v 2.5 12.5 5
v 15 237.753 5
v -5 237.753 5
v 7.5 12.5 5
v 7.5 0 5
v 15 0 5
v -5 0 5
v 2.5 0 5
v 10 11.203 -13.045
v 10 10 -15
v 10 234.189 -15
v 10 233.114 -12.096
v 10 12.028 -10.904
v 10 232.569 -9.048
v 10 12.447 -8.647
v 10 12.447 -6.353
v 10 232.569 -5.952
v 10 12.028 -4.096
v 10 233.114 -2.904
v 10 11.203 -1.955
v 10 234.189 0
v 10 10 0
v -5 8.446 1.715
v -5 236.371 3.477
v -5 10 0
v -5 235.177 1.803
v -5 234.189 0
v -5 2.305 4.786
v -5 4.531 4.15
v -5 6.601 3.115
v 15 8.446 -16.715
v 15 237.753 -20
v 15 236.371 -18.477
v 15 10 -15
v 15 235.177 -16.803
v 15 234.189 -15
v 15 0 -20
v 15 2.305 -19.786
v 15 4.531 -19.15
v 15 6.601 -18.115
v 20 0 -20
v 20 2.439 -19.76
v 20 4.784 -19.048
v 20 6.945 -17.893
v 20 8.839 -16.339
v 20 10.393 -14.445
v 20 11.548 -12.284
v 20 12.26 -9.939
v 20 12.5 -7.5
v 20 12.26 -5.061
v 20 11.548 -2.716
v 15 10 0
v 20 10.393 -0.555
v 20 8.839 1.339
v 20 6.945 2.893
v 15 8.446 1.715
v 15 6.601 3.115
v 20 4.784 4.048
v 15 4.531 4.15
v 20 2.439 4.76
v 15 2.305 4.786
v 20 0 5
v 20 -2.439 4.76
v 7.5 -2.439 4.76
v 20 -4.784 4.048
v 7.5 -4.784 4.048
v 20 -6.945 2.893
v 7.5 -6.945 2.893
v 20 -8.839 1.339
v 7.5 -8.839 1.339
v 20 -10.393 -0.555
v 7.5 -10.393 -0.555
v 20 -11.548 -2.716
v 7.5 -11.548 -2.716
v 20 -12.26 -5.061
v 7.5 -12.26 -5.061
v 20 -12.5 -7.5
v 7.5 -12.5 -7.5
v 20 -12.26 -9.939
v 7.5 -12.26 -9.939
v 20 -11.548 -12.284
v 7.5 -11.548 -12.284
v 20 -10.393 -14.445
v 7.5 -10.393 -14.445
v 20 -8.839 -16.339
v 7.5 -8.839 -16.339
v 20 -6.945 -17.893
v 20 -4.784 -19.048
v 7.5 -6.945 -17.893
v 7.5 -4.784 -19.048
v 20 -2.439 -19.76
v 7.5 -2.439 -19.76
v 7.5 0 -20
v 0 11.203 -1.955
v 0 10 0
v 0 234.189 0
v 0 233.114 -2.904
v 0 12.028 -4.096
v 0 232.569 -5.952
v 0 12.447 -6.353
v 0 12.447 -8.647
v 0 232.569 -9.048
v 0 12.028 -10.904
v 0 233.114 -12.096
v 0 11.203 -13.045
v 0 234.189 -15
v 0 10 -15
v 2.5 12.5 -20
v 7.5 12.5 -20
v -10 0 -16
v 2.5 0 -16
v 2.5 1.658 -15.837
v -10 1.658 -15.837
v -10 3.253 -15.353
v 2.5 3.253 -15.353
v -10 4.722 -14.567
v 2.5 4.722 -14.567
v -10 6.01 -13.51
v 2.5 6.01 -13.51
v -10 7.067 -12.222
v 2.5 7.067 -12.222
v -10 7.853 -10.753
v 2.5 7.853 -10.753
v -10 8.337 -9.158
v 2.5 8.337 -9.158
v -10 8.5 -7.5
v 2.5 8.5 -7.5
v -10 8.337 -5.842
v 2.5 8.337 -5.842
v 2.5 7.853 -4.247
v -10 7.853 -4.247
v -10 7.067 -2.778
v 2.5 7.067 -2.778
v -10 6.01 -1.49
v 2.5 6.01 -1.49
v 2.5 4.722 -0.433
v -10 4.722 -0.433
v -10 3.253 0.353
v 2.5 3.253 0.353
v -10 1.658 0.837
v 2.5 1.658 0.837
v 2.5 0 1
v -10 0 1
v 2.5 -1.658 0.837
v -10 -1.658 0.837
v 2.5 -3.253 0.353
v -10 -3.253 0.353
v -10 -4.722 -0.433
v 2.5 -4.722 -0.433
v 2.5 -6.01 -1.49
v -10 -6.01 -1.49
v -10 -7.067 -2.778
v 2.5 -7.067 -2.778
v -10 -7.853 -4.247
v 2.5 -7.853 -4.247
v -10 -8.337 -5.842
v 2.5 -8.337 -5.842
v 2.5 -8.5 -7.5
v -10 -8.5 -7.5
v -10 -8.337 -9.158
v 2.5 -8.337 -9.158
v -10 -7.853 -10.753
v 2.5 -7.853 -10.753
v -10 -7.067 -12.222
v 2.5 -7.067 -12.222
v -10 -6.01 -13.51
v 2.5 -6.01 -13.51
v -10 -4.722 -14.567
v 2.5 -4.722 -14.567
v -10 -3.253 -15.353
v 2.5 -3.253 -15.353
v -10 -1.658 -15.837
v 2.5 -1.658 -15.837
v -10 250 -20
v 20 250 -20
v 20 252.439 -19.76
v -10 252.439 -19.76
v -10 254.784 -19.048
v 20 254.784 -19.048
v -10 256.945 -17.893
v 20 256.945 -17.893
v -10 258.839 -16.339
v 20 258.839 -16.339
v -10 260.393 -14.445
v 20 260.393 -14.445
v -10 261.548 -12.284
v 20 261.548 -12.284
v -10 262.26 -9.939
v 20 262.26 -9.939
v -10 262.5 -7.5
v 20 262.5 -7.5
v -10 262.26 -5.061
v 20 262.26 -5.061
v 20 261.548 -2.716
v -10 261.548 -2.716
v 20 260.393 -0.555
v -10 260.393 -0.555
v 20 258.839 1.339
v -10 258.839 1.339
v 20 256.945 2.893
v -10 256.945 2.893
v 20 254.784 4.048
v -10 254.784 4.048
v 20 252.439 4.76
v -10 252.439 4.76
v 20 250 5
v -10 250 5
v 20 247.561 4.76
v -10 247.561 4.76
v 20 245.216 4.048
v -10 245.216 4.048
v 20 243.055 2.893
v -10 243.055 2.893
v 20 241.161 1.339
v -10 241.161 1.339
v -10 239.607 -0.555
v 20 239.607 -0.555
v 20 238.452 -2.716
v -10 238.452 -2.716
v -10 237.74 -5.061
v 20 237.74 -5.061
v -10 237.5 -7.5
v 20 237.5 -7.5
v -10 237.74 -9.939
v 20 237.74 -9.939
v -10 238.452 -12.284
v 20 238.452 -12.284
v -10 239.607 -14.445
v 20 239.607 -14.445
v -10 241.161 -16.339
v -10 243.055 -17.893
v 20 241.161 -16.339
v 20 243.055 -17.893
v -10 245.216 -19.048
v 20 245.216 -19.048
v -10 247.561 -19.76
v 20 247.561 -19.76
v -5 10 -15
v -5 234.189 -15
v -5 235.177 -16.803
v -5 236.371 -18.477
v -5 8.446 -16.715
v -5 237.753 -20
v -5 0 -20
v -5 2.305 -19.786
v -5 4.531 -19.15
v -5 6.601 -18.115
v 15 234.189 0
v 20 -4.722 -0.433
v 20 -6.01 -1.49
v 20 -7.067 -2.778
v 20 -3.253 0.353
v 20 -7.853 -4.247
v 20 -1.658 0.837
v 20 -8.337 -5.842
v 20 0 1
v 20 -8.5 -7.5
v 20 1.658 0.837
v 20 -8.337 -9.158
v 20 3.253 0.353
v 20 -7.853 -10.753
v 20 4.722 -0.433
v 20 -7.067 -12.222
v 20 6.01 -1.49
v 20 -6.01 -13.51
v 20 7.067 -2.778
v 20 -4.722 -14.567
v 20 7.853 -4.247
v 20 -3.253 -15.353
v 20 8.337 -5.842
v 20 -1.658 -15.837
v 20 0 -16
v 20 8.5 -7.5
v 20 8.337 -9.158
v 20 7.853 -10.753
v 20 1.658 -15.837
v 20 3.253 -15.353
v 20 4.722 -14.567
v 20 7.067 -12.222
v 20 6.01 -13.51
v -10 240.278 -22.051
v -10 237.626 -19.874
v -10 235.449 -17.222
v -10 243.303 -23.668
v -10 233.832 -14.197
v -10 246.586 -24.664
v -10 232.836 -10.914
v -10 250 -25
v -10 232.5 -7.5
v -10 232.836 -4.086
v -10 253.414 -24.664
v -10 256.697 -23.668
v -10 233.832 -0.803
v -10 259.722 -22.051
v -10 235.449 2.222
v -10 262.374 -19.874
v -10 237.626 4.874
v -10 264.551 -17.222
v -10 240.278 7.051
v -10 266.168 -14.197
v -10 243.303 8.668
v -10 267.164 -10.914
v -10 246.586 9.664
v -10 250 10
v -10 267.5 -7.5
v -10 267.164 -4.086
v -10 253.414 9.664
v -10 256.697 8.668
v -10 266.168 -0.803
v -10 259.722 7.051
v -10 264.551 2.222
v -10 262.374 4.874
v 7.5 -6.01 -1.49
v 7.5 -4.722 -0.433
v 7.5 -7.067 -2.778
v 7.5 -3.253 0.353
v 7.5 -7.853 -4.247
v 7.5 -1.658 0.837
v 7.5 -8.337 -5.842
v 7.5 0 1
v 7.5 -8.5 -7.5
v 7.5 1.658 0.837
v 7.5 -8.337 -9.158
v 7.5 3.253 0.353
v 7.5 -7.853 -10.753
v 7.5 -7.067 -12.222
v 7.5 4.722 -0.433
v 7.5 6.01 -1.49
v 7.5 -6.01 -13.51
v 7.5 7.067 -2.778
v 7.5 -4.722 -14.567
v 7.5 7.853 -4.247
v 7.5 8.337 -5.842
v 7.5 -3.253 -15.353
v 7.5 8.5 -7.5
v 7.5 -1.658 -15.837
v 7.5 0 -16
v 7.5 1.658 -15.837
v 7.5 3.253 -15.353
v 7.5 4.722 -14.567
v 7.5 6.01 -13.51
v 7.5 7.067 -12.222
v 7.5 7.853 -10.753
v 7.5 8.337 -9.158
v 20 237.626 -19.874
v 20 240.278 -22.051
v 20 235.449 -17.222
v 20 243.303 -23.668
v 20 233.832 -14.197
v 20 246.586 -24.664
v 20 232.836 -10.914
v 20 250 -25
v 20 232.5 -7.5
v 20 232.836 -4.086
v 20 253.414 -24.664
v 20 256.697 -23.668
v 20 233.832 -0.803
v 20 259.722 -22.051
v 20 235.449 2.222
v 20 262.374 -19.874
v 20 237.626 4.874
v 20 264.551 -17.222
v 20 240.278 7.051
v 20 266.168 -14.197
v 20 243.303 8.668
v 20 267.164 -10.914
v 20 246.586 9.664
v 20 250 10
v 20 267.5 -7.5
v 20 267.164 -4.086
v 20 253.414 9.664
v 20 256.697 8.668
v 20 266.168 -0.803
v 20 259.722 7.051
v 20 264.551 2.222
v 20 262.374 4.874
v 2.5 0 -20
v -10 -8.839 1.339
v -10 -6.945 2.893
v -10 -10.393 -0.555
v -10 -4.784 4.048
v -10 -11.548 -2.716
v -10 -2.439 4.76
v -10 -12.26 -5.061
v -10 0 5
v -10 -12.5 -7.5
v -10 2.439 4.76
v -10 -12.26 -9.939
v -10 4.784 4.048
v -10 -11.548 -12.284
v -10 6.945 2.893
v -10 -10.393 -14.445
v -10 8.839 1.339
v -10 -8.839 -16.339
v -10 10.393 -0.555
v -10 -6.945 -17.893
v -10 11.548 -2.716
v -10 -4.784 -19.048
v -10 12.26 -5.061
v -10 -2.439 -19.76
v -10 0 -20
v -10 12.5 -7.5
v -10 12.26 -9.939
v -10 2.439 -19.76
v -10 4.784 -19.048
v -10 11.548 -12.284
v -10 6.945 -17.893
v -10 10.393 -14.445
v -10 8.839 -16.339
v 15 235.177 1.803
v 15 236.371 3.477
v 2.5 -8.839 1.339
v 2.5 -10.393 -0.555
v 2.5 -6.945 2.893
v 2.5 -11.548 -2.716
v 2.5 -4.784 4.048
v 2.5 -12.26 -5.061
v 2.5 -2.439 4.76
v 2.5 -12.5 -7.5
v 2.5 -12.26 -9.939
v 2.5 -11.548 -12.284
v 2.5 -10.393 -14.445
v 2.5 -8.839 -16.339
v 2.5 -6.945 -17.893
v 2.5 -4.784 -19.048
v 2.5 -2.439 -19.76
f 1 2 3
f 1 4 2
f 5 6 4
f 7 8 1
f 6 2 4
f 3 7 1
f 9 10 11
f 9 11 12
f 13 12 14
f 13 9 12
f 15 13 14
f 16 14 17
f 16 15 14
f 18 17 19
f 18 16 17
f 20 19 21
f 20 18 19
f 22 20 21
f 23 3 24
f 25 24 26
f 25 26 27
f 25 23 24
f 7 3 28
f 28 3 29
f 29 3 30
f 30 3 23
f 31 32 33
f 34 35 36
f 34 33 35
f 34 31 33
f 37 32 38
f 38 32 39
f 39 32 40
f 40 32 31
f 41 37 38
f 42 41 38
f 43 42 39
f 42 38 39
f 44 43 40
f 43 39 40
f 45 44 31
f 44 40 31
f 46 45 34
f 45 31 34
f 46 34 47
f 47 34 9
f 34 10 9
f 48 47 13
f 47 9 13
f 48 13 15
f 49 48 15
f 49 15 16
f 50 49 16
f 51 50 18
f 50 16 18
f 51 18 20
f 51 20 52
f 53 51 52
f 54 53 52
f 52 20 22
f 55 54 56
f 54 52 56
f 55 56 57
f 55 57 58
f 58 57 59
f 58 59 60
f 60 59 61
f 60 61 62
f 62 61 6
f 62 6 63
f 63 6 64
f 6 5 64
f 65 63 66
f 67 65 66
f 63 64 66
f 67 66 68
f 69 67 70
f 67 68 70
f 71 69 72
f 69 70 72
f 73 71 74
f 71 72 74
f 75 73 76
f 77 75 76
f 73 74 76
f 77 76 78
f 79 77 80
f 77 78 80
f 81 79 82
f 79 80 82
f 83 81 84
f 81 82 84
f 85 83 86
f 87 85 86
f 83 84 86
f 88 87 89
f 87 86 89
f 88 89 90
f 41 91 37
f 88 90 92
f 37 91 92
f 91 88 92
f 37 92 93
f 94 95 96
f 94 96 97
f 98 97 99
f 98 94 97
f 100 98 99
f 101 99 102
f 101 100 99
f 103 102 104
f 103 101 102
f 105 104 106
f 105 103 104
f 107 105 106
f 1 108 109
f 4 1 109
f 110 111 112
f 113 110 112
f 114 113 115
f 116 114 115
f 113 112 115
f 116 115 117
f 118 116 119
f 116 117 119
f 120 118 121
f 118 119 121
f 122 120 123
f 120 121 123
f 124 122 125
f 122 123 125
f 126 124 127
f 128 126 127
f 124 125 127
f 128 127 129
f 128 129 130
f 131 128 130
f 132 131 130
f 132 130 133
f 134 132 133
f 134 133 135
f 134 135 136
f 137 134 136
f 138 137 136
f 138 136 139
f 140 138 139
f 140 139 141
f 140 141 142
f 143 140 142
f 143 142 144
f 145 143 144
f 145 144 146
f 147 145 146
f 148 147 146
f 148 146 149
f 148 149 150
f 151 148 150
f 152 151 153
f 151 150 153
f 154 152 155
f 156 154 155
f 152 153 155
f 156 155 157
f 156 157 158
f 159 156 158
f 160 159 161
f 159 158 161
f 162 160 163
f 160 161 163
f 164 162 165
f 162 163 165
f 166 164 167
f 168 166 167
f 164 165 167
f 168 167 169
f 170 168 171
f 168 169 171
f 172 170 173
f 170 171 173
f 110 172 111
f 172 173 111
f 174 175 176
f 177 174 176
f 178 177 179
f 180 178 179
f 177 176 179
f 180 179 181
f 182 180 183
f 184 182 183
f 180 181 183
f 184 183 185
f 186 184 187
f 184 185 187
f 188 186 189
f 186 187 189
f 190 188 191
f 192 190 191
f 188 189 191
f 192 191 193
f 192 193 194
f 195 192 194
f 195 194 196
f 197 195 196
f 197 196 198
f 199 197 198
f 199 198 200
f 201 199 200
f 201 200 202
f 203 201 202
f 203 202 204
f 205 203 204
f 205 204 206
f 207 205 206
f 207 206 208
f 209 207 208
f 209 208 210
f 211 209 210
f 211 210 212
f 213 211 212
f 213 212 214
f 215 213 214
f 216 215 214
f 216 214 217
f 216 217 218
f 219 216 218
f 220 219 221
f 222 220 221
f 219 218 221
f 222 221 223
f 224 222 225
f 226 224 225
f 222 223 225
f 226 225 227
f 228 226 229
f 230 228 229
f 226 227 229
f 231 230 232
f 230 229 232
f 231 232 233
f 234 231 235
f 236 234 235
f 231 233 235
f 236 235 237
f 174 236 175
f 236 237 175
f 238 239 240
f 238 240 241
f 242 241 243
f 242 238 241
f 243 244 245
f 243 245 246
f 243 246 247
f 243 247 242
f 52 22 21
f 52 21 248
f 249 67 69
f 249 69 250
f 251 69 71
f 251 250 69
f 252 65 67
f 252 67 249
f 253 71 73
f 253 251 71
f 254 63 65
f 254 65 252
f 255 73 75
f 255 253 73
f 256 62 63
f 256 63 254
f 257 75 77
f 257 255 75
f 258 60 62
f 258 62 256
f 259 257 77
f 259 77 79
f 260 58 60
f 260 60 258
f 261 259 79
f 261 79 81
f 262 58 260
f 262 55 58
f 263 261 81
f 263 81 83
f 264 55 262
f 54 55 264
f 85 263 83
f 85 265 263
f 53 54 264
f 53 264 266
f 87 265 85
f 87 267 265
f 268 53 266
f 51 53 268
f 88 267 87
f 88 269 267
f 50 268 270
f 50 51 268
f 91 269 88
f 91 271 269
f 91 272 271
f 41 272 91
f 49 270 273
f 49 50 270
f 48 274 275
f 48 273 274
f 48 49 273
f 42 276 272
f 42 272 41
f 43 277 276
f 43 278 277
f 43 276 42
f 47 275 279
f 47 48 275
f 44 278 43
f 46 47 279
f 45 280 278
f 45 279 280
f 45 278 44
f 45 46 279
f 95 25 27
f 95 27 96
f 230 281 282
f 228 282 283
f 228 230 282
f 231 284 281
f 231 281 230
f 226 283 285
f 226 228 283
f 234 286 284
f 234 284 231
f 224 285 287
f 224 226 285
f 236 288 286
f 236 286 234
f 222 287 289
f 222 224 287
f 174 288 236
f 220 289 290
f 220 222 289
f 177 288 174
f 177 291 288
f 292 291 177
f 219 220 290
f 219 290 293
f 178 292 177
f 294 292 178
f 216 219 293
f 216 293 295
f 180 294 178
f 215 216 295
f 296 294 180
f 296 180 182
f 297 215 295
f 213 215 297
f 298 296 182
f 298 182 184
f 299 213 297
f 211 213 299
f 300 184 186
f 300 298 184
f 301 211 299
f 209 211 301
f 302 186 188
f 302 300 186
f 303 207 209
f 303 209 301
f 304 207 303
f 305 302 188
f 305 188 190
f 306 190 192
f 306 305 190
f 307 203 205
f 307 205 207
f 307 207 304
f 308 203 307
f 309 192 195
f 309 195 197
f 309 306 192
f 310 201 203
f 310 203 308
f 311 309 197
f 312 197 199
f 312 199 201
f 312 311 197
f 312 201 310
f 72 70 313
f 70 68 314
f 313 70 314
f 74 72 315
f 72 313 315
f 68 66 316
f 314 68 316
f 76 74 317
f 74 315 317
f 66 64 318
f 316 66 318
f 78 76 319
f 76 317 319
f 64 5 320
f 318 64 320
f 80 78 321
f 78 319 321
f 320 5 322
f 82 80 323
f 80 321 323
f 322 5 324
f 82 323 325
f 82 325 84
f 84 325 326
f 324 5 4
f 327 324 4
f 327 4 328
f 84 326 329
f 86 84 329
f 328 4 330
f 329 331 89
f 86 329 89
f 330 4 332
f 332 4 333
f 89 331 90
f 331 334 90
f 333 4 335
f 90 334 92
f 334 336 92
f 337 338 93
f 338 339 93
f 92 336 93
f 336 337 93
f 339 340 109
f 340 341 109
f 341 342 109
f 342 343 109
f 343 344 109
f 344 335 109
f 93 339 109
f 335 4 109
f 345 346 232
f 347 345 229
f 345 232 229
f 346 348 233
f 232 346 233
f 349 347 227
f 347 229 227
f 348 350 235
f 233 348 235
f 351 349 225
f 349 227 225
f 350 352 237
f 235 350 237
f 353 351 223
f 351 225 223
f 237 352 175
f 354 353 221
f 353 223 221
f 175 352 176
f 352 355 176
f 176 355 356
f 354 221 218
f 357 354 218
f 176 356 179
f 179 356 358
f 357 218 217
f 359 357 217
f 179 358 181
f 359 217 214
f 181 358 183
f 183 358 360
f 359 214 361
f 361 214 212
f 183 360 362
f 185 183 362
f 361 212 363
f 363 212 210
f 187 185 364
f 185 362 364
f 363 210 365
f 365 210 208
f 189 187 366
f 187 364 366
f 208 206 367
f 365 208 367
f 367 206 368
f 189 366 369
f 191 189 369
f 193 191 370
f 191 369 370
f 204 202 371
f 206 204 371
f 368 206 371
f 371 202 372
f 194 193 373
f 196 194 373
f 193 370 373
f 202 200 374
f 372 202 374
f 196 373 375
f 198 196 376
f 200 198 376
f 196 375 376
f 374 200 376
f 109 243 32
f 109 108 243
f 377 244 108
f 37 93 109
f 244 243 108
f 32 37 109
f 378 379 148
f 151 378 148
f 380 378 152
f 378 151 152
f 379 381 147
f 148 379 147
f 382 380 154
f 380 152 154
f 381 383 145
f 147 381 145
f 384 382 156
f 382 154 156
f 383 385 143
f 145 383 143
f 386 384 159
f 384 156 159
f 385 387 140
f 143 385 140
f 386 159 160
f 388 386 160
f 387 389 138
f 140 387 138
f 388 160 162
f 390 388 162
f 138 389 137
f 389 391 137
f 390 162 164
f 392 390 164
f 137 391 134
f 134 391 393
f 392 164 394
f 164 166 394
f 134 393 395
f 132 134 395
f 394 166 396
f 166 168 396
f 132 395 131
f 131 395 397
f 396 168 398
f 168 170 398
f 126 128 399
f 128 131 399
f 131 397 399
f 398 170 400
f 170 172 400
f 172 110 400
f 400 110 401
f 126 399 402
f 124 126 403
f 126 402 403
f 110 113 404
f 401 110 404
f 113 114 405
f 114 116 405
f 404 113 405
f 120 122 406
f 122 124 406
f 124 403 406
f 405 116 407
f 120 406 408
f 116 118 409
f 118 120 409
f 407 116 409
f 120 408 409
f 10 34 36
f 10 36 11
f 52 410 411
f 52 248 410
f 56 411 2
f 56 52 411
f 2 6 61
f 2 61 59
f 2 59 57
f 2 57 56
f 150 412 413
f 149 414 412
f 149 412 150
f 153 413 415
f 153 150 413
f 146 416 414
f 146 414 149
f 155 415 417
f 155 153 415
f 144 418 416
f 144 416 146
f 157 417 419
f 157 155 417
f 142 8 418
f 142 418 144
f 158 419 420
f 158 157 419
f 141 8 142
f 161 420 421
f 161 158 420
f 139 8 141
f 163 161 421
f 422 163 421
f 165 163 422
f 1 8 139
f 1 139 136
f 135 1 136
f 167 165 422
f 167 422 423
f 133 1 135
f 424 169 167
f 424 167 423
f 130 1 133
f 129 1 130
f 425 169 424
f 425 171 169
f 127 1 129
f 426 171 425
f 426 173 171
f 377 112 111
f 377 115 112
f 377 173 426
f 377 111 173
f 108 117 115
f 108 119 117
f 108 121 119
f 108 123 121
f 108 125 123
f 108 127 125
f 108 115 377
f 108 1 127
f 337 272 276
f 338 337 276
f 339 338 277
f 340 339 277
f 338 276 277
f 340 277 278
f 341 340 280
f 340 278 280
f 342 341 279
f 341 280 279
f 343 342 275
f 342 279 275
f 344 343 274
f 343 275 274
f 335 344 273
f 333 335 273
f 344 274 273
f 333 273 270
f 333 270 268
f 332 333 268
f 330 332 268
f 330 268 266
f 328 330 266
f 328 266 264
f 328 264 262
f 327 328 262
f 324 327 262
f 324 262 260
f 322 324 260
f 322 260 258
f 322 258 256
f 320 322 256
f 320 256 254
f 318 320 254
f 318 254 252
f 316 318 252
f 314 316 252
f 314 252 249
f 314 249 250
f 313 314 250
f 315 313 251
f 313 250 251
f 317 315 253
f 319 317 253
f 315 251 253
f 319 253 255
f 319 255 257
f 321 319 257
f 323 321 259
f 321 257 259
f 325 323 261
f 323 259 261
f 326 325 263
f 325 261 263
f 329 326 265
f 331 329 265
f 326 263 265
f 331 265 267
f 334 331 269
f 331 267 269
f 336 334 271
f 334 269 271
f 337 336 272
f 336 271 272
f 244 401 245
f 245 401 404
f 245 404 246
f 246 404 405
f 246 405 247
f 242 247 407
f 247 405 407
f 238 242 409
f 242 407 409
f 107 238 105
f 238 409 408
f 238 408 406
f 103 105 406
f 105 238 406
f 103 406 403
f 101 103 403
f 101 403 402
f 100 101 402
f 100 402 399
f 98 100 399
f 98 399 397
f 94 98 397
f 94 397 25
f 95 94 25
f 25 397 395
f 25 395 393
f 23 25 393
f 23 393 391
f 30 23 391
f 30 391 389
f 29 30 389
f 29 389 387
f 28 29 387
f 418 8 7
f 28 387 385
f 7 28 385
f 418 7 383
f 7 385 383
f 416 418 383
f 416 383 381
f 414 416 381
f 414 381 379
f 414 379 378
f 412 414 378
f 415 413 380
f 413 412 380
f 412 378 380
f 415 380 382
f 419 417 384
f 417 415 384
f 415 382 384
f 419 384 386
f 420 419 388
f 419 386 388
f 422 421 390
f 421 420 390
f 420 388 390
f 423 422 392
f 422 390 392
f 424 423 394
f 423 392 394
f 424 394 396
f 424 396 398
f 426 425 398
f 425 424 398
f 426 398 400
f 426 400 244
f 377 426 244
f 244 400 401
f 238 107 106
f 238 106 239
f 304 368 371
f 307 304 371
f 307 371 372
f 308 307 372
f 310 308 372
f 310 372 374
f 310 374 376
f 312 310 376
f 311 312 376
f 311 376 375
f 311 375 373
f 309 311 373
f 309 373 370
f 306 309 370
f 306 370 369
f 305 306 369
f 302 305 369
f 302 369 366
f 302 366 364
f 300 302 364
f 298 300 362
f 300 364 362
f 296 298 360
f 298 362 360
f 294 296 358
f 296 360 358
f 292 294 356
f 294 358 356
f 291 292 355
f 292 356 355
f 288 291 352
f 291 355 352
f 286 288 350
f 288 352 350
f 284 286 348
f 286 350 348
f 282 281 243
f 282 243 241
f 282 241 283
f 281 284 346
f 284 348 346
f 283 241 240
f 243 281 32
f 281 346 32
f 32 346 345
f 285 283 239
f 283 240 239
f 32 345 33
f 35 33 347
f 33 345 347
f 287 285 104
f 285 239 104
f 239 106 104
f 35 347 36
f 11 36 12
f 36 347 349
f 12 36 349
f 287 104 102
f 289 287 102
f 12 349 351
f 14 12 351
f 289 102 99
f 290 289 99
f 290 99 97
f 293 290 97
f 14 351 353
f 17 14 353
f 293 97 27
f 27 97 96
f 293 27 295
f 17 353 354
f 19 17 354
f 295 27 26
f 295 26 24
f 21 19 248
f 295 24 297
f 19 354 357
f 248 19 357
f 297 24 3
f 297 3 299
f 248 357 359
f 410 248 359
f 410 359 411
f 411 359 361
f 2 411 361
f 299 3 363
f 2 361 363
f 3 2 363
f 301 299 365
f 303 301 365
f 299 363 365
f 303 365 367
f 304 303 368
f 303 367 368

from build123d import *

# Parameters (mm, degrees)
BOSS_EXTRUDE1_DEPTH      = 250
BOSS_EXTRUDE2_DEPTH      = 10
BOSS_EXTRUDE2_DEPTH_BACK = 20
SKETCH2_R                = 12.5
SKETCH3_R                = 8.5
CUT_EXTRUDE1_DEPTH       = 253.586618806
BOSS_EXTRUDE3_DEPTH      = 10
BOSS_EXTRUDE3_DEPTH_BACK = 20
SKETCH4_R                = 17.5
SKETCH5_R                = 12.5
CUT_EXTRUDE2_DEPTH       = 271.335439778
CUT_EXTRUDE3_START       = 12.5
SKETCH6_W                = 5
SKETCH6_H                = 40
CUT_EXTRUDE3_DEPTH       = 39


with BuildPart() as part:
    # Sketch1 → Boss-Extrude1 (new body)
    with BuildSketch(Plane(origin=(0, 0, 0), x_dir=(1, 0, 0), z_dir=(0, 1, 0))):
        Polygon((0, 0), (0, 15), (-5, 15), (-5, 20), (15, 20), (15, 15), (10, 15), (10, 0), (15, 0), (15, -5), (-5, -5), (-5, 0), align=None)
    extrude(amount=BOSS_EXTRUDE1_DEPTH)

    # Sketch2 → Boss-Extrude2 (add, two sides: drawn at the far end of the back side and taken through both)
    with BuildSketch(Plane(origin=(10, 0, 0), x_dir=(0, 0, -1), z_dir=(1, 0, 0)).offset(-BOSS_EXTRUDE2_DEPTH_BACK)):
        with Locations((7.5, 0)):
            Circle(SKETCH2_R)
    extrude(amount=BOSS_EXTRUDE2_DEPTH + BOSS_EXTRUDE2_DEPTH_BACK)

    # Sketch3 → Cut-Extrude1 (cut, through all)
    with BuildSketch(Plane(origin=(20, 0, 0), x_dir=(0, 0, -1), z_dir=(1, 0, 0))):
        with Locations((7.5, 0)):
            Circle(SKETCH3_R)
    extrude(amount=-CUT_EXTRUDE1_DEPTH, mode=Mode.SUBTRACT)

    # Sketch4 → Boss-Extrude3 (add, two sides: drawn at the far end of the back side and taken through both)
    with BuildSketch(Plane.ZY.offset(-BOSS_EXTRUDE3_DEPTH_BACK)):
        with Locations((-7.5, 250)):
            Circle(SKETCH4_R)
    extrude(amount=BOSS_EXTRUDE3_DEPTH + BOSS_EXTRUDE3_DEPTH_BACK)

    # Sketch5 → Cut-Extrude2 (cut, through all)
    with BuildSketch(Plane(origin=(20, 0, 0), x_dir=(0, 0, -1), z_dir=(1, 0, 0))):
        with Locations((7.5, 250)):
            Circle(SKETCH5_R)
    extrude(amount=-CUT_EXTRUDE2_DEPTH, mode=Mode.SUBTRACT)

    # Sketch6 → Cut-Extrude3 (cut)
    with BuildSketch(Plane(origin=(0, 0, 0), x_dir=(1, 0, 0), z_dir=(0, 1, 0)).offset(CUT_EXTRUDE3_START)):
        with Locations((5, 5)):
            Rectangle(SKETCH6_W, SKETCH6_H)
    extrude(amount=-CUT_EXTRUDE3_DEPTH, mode=Mode.SUBTRACT)


solid = part.part
